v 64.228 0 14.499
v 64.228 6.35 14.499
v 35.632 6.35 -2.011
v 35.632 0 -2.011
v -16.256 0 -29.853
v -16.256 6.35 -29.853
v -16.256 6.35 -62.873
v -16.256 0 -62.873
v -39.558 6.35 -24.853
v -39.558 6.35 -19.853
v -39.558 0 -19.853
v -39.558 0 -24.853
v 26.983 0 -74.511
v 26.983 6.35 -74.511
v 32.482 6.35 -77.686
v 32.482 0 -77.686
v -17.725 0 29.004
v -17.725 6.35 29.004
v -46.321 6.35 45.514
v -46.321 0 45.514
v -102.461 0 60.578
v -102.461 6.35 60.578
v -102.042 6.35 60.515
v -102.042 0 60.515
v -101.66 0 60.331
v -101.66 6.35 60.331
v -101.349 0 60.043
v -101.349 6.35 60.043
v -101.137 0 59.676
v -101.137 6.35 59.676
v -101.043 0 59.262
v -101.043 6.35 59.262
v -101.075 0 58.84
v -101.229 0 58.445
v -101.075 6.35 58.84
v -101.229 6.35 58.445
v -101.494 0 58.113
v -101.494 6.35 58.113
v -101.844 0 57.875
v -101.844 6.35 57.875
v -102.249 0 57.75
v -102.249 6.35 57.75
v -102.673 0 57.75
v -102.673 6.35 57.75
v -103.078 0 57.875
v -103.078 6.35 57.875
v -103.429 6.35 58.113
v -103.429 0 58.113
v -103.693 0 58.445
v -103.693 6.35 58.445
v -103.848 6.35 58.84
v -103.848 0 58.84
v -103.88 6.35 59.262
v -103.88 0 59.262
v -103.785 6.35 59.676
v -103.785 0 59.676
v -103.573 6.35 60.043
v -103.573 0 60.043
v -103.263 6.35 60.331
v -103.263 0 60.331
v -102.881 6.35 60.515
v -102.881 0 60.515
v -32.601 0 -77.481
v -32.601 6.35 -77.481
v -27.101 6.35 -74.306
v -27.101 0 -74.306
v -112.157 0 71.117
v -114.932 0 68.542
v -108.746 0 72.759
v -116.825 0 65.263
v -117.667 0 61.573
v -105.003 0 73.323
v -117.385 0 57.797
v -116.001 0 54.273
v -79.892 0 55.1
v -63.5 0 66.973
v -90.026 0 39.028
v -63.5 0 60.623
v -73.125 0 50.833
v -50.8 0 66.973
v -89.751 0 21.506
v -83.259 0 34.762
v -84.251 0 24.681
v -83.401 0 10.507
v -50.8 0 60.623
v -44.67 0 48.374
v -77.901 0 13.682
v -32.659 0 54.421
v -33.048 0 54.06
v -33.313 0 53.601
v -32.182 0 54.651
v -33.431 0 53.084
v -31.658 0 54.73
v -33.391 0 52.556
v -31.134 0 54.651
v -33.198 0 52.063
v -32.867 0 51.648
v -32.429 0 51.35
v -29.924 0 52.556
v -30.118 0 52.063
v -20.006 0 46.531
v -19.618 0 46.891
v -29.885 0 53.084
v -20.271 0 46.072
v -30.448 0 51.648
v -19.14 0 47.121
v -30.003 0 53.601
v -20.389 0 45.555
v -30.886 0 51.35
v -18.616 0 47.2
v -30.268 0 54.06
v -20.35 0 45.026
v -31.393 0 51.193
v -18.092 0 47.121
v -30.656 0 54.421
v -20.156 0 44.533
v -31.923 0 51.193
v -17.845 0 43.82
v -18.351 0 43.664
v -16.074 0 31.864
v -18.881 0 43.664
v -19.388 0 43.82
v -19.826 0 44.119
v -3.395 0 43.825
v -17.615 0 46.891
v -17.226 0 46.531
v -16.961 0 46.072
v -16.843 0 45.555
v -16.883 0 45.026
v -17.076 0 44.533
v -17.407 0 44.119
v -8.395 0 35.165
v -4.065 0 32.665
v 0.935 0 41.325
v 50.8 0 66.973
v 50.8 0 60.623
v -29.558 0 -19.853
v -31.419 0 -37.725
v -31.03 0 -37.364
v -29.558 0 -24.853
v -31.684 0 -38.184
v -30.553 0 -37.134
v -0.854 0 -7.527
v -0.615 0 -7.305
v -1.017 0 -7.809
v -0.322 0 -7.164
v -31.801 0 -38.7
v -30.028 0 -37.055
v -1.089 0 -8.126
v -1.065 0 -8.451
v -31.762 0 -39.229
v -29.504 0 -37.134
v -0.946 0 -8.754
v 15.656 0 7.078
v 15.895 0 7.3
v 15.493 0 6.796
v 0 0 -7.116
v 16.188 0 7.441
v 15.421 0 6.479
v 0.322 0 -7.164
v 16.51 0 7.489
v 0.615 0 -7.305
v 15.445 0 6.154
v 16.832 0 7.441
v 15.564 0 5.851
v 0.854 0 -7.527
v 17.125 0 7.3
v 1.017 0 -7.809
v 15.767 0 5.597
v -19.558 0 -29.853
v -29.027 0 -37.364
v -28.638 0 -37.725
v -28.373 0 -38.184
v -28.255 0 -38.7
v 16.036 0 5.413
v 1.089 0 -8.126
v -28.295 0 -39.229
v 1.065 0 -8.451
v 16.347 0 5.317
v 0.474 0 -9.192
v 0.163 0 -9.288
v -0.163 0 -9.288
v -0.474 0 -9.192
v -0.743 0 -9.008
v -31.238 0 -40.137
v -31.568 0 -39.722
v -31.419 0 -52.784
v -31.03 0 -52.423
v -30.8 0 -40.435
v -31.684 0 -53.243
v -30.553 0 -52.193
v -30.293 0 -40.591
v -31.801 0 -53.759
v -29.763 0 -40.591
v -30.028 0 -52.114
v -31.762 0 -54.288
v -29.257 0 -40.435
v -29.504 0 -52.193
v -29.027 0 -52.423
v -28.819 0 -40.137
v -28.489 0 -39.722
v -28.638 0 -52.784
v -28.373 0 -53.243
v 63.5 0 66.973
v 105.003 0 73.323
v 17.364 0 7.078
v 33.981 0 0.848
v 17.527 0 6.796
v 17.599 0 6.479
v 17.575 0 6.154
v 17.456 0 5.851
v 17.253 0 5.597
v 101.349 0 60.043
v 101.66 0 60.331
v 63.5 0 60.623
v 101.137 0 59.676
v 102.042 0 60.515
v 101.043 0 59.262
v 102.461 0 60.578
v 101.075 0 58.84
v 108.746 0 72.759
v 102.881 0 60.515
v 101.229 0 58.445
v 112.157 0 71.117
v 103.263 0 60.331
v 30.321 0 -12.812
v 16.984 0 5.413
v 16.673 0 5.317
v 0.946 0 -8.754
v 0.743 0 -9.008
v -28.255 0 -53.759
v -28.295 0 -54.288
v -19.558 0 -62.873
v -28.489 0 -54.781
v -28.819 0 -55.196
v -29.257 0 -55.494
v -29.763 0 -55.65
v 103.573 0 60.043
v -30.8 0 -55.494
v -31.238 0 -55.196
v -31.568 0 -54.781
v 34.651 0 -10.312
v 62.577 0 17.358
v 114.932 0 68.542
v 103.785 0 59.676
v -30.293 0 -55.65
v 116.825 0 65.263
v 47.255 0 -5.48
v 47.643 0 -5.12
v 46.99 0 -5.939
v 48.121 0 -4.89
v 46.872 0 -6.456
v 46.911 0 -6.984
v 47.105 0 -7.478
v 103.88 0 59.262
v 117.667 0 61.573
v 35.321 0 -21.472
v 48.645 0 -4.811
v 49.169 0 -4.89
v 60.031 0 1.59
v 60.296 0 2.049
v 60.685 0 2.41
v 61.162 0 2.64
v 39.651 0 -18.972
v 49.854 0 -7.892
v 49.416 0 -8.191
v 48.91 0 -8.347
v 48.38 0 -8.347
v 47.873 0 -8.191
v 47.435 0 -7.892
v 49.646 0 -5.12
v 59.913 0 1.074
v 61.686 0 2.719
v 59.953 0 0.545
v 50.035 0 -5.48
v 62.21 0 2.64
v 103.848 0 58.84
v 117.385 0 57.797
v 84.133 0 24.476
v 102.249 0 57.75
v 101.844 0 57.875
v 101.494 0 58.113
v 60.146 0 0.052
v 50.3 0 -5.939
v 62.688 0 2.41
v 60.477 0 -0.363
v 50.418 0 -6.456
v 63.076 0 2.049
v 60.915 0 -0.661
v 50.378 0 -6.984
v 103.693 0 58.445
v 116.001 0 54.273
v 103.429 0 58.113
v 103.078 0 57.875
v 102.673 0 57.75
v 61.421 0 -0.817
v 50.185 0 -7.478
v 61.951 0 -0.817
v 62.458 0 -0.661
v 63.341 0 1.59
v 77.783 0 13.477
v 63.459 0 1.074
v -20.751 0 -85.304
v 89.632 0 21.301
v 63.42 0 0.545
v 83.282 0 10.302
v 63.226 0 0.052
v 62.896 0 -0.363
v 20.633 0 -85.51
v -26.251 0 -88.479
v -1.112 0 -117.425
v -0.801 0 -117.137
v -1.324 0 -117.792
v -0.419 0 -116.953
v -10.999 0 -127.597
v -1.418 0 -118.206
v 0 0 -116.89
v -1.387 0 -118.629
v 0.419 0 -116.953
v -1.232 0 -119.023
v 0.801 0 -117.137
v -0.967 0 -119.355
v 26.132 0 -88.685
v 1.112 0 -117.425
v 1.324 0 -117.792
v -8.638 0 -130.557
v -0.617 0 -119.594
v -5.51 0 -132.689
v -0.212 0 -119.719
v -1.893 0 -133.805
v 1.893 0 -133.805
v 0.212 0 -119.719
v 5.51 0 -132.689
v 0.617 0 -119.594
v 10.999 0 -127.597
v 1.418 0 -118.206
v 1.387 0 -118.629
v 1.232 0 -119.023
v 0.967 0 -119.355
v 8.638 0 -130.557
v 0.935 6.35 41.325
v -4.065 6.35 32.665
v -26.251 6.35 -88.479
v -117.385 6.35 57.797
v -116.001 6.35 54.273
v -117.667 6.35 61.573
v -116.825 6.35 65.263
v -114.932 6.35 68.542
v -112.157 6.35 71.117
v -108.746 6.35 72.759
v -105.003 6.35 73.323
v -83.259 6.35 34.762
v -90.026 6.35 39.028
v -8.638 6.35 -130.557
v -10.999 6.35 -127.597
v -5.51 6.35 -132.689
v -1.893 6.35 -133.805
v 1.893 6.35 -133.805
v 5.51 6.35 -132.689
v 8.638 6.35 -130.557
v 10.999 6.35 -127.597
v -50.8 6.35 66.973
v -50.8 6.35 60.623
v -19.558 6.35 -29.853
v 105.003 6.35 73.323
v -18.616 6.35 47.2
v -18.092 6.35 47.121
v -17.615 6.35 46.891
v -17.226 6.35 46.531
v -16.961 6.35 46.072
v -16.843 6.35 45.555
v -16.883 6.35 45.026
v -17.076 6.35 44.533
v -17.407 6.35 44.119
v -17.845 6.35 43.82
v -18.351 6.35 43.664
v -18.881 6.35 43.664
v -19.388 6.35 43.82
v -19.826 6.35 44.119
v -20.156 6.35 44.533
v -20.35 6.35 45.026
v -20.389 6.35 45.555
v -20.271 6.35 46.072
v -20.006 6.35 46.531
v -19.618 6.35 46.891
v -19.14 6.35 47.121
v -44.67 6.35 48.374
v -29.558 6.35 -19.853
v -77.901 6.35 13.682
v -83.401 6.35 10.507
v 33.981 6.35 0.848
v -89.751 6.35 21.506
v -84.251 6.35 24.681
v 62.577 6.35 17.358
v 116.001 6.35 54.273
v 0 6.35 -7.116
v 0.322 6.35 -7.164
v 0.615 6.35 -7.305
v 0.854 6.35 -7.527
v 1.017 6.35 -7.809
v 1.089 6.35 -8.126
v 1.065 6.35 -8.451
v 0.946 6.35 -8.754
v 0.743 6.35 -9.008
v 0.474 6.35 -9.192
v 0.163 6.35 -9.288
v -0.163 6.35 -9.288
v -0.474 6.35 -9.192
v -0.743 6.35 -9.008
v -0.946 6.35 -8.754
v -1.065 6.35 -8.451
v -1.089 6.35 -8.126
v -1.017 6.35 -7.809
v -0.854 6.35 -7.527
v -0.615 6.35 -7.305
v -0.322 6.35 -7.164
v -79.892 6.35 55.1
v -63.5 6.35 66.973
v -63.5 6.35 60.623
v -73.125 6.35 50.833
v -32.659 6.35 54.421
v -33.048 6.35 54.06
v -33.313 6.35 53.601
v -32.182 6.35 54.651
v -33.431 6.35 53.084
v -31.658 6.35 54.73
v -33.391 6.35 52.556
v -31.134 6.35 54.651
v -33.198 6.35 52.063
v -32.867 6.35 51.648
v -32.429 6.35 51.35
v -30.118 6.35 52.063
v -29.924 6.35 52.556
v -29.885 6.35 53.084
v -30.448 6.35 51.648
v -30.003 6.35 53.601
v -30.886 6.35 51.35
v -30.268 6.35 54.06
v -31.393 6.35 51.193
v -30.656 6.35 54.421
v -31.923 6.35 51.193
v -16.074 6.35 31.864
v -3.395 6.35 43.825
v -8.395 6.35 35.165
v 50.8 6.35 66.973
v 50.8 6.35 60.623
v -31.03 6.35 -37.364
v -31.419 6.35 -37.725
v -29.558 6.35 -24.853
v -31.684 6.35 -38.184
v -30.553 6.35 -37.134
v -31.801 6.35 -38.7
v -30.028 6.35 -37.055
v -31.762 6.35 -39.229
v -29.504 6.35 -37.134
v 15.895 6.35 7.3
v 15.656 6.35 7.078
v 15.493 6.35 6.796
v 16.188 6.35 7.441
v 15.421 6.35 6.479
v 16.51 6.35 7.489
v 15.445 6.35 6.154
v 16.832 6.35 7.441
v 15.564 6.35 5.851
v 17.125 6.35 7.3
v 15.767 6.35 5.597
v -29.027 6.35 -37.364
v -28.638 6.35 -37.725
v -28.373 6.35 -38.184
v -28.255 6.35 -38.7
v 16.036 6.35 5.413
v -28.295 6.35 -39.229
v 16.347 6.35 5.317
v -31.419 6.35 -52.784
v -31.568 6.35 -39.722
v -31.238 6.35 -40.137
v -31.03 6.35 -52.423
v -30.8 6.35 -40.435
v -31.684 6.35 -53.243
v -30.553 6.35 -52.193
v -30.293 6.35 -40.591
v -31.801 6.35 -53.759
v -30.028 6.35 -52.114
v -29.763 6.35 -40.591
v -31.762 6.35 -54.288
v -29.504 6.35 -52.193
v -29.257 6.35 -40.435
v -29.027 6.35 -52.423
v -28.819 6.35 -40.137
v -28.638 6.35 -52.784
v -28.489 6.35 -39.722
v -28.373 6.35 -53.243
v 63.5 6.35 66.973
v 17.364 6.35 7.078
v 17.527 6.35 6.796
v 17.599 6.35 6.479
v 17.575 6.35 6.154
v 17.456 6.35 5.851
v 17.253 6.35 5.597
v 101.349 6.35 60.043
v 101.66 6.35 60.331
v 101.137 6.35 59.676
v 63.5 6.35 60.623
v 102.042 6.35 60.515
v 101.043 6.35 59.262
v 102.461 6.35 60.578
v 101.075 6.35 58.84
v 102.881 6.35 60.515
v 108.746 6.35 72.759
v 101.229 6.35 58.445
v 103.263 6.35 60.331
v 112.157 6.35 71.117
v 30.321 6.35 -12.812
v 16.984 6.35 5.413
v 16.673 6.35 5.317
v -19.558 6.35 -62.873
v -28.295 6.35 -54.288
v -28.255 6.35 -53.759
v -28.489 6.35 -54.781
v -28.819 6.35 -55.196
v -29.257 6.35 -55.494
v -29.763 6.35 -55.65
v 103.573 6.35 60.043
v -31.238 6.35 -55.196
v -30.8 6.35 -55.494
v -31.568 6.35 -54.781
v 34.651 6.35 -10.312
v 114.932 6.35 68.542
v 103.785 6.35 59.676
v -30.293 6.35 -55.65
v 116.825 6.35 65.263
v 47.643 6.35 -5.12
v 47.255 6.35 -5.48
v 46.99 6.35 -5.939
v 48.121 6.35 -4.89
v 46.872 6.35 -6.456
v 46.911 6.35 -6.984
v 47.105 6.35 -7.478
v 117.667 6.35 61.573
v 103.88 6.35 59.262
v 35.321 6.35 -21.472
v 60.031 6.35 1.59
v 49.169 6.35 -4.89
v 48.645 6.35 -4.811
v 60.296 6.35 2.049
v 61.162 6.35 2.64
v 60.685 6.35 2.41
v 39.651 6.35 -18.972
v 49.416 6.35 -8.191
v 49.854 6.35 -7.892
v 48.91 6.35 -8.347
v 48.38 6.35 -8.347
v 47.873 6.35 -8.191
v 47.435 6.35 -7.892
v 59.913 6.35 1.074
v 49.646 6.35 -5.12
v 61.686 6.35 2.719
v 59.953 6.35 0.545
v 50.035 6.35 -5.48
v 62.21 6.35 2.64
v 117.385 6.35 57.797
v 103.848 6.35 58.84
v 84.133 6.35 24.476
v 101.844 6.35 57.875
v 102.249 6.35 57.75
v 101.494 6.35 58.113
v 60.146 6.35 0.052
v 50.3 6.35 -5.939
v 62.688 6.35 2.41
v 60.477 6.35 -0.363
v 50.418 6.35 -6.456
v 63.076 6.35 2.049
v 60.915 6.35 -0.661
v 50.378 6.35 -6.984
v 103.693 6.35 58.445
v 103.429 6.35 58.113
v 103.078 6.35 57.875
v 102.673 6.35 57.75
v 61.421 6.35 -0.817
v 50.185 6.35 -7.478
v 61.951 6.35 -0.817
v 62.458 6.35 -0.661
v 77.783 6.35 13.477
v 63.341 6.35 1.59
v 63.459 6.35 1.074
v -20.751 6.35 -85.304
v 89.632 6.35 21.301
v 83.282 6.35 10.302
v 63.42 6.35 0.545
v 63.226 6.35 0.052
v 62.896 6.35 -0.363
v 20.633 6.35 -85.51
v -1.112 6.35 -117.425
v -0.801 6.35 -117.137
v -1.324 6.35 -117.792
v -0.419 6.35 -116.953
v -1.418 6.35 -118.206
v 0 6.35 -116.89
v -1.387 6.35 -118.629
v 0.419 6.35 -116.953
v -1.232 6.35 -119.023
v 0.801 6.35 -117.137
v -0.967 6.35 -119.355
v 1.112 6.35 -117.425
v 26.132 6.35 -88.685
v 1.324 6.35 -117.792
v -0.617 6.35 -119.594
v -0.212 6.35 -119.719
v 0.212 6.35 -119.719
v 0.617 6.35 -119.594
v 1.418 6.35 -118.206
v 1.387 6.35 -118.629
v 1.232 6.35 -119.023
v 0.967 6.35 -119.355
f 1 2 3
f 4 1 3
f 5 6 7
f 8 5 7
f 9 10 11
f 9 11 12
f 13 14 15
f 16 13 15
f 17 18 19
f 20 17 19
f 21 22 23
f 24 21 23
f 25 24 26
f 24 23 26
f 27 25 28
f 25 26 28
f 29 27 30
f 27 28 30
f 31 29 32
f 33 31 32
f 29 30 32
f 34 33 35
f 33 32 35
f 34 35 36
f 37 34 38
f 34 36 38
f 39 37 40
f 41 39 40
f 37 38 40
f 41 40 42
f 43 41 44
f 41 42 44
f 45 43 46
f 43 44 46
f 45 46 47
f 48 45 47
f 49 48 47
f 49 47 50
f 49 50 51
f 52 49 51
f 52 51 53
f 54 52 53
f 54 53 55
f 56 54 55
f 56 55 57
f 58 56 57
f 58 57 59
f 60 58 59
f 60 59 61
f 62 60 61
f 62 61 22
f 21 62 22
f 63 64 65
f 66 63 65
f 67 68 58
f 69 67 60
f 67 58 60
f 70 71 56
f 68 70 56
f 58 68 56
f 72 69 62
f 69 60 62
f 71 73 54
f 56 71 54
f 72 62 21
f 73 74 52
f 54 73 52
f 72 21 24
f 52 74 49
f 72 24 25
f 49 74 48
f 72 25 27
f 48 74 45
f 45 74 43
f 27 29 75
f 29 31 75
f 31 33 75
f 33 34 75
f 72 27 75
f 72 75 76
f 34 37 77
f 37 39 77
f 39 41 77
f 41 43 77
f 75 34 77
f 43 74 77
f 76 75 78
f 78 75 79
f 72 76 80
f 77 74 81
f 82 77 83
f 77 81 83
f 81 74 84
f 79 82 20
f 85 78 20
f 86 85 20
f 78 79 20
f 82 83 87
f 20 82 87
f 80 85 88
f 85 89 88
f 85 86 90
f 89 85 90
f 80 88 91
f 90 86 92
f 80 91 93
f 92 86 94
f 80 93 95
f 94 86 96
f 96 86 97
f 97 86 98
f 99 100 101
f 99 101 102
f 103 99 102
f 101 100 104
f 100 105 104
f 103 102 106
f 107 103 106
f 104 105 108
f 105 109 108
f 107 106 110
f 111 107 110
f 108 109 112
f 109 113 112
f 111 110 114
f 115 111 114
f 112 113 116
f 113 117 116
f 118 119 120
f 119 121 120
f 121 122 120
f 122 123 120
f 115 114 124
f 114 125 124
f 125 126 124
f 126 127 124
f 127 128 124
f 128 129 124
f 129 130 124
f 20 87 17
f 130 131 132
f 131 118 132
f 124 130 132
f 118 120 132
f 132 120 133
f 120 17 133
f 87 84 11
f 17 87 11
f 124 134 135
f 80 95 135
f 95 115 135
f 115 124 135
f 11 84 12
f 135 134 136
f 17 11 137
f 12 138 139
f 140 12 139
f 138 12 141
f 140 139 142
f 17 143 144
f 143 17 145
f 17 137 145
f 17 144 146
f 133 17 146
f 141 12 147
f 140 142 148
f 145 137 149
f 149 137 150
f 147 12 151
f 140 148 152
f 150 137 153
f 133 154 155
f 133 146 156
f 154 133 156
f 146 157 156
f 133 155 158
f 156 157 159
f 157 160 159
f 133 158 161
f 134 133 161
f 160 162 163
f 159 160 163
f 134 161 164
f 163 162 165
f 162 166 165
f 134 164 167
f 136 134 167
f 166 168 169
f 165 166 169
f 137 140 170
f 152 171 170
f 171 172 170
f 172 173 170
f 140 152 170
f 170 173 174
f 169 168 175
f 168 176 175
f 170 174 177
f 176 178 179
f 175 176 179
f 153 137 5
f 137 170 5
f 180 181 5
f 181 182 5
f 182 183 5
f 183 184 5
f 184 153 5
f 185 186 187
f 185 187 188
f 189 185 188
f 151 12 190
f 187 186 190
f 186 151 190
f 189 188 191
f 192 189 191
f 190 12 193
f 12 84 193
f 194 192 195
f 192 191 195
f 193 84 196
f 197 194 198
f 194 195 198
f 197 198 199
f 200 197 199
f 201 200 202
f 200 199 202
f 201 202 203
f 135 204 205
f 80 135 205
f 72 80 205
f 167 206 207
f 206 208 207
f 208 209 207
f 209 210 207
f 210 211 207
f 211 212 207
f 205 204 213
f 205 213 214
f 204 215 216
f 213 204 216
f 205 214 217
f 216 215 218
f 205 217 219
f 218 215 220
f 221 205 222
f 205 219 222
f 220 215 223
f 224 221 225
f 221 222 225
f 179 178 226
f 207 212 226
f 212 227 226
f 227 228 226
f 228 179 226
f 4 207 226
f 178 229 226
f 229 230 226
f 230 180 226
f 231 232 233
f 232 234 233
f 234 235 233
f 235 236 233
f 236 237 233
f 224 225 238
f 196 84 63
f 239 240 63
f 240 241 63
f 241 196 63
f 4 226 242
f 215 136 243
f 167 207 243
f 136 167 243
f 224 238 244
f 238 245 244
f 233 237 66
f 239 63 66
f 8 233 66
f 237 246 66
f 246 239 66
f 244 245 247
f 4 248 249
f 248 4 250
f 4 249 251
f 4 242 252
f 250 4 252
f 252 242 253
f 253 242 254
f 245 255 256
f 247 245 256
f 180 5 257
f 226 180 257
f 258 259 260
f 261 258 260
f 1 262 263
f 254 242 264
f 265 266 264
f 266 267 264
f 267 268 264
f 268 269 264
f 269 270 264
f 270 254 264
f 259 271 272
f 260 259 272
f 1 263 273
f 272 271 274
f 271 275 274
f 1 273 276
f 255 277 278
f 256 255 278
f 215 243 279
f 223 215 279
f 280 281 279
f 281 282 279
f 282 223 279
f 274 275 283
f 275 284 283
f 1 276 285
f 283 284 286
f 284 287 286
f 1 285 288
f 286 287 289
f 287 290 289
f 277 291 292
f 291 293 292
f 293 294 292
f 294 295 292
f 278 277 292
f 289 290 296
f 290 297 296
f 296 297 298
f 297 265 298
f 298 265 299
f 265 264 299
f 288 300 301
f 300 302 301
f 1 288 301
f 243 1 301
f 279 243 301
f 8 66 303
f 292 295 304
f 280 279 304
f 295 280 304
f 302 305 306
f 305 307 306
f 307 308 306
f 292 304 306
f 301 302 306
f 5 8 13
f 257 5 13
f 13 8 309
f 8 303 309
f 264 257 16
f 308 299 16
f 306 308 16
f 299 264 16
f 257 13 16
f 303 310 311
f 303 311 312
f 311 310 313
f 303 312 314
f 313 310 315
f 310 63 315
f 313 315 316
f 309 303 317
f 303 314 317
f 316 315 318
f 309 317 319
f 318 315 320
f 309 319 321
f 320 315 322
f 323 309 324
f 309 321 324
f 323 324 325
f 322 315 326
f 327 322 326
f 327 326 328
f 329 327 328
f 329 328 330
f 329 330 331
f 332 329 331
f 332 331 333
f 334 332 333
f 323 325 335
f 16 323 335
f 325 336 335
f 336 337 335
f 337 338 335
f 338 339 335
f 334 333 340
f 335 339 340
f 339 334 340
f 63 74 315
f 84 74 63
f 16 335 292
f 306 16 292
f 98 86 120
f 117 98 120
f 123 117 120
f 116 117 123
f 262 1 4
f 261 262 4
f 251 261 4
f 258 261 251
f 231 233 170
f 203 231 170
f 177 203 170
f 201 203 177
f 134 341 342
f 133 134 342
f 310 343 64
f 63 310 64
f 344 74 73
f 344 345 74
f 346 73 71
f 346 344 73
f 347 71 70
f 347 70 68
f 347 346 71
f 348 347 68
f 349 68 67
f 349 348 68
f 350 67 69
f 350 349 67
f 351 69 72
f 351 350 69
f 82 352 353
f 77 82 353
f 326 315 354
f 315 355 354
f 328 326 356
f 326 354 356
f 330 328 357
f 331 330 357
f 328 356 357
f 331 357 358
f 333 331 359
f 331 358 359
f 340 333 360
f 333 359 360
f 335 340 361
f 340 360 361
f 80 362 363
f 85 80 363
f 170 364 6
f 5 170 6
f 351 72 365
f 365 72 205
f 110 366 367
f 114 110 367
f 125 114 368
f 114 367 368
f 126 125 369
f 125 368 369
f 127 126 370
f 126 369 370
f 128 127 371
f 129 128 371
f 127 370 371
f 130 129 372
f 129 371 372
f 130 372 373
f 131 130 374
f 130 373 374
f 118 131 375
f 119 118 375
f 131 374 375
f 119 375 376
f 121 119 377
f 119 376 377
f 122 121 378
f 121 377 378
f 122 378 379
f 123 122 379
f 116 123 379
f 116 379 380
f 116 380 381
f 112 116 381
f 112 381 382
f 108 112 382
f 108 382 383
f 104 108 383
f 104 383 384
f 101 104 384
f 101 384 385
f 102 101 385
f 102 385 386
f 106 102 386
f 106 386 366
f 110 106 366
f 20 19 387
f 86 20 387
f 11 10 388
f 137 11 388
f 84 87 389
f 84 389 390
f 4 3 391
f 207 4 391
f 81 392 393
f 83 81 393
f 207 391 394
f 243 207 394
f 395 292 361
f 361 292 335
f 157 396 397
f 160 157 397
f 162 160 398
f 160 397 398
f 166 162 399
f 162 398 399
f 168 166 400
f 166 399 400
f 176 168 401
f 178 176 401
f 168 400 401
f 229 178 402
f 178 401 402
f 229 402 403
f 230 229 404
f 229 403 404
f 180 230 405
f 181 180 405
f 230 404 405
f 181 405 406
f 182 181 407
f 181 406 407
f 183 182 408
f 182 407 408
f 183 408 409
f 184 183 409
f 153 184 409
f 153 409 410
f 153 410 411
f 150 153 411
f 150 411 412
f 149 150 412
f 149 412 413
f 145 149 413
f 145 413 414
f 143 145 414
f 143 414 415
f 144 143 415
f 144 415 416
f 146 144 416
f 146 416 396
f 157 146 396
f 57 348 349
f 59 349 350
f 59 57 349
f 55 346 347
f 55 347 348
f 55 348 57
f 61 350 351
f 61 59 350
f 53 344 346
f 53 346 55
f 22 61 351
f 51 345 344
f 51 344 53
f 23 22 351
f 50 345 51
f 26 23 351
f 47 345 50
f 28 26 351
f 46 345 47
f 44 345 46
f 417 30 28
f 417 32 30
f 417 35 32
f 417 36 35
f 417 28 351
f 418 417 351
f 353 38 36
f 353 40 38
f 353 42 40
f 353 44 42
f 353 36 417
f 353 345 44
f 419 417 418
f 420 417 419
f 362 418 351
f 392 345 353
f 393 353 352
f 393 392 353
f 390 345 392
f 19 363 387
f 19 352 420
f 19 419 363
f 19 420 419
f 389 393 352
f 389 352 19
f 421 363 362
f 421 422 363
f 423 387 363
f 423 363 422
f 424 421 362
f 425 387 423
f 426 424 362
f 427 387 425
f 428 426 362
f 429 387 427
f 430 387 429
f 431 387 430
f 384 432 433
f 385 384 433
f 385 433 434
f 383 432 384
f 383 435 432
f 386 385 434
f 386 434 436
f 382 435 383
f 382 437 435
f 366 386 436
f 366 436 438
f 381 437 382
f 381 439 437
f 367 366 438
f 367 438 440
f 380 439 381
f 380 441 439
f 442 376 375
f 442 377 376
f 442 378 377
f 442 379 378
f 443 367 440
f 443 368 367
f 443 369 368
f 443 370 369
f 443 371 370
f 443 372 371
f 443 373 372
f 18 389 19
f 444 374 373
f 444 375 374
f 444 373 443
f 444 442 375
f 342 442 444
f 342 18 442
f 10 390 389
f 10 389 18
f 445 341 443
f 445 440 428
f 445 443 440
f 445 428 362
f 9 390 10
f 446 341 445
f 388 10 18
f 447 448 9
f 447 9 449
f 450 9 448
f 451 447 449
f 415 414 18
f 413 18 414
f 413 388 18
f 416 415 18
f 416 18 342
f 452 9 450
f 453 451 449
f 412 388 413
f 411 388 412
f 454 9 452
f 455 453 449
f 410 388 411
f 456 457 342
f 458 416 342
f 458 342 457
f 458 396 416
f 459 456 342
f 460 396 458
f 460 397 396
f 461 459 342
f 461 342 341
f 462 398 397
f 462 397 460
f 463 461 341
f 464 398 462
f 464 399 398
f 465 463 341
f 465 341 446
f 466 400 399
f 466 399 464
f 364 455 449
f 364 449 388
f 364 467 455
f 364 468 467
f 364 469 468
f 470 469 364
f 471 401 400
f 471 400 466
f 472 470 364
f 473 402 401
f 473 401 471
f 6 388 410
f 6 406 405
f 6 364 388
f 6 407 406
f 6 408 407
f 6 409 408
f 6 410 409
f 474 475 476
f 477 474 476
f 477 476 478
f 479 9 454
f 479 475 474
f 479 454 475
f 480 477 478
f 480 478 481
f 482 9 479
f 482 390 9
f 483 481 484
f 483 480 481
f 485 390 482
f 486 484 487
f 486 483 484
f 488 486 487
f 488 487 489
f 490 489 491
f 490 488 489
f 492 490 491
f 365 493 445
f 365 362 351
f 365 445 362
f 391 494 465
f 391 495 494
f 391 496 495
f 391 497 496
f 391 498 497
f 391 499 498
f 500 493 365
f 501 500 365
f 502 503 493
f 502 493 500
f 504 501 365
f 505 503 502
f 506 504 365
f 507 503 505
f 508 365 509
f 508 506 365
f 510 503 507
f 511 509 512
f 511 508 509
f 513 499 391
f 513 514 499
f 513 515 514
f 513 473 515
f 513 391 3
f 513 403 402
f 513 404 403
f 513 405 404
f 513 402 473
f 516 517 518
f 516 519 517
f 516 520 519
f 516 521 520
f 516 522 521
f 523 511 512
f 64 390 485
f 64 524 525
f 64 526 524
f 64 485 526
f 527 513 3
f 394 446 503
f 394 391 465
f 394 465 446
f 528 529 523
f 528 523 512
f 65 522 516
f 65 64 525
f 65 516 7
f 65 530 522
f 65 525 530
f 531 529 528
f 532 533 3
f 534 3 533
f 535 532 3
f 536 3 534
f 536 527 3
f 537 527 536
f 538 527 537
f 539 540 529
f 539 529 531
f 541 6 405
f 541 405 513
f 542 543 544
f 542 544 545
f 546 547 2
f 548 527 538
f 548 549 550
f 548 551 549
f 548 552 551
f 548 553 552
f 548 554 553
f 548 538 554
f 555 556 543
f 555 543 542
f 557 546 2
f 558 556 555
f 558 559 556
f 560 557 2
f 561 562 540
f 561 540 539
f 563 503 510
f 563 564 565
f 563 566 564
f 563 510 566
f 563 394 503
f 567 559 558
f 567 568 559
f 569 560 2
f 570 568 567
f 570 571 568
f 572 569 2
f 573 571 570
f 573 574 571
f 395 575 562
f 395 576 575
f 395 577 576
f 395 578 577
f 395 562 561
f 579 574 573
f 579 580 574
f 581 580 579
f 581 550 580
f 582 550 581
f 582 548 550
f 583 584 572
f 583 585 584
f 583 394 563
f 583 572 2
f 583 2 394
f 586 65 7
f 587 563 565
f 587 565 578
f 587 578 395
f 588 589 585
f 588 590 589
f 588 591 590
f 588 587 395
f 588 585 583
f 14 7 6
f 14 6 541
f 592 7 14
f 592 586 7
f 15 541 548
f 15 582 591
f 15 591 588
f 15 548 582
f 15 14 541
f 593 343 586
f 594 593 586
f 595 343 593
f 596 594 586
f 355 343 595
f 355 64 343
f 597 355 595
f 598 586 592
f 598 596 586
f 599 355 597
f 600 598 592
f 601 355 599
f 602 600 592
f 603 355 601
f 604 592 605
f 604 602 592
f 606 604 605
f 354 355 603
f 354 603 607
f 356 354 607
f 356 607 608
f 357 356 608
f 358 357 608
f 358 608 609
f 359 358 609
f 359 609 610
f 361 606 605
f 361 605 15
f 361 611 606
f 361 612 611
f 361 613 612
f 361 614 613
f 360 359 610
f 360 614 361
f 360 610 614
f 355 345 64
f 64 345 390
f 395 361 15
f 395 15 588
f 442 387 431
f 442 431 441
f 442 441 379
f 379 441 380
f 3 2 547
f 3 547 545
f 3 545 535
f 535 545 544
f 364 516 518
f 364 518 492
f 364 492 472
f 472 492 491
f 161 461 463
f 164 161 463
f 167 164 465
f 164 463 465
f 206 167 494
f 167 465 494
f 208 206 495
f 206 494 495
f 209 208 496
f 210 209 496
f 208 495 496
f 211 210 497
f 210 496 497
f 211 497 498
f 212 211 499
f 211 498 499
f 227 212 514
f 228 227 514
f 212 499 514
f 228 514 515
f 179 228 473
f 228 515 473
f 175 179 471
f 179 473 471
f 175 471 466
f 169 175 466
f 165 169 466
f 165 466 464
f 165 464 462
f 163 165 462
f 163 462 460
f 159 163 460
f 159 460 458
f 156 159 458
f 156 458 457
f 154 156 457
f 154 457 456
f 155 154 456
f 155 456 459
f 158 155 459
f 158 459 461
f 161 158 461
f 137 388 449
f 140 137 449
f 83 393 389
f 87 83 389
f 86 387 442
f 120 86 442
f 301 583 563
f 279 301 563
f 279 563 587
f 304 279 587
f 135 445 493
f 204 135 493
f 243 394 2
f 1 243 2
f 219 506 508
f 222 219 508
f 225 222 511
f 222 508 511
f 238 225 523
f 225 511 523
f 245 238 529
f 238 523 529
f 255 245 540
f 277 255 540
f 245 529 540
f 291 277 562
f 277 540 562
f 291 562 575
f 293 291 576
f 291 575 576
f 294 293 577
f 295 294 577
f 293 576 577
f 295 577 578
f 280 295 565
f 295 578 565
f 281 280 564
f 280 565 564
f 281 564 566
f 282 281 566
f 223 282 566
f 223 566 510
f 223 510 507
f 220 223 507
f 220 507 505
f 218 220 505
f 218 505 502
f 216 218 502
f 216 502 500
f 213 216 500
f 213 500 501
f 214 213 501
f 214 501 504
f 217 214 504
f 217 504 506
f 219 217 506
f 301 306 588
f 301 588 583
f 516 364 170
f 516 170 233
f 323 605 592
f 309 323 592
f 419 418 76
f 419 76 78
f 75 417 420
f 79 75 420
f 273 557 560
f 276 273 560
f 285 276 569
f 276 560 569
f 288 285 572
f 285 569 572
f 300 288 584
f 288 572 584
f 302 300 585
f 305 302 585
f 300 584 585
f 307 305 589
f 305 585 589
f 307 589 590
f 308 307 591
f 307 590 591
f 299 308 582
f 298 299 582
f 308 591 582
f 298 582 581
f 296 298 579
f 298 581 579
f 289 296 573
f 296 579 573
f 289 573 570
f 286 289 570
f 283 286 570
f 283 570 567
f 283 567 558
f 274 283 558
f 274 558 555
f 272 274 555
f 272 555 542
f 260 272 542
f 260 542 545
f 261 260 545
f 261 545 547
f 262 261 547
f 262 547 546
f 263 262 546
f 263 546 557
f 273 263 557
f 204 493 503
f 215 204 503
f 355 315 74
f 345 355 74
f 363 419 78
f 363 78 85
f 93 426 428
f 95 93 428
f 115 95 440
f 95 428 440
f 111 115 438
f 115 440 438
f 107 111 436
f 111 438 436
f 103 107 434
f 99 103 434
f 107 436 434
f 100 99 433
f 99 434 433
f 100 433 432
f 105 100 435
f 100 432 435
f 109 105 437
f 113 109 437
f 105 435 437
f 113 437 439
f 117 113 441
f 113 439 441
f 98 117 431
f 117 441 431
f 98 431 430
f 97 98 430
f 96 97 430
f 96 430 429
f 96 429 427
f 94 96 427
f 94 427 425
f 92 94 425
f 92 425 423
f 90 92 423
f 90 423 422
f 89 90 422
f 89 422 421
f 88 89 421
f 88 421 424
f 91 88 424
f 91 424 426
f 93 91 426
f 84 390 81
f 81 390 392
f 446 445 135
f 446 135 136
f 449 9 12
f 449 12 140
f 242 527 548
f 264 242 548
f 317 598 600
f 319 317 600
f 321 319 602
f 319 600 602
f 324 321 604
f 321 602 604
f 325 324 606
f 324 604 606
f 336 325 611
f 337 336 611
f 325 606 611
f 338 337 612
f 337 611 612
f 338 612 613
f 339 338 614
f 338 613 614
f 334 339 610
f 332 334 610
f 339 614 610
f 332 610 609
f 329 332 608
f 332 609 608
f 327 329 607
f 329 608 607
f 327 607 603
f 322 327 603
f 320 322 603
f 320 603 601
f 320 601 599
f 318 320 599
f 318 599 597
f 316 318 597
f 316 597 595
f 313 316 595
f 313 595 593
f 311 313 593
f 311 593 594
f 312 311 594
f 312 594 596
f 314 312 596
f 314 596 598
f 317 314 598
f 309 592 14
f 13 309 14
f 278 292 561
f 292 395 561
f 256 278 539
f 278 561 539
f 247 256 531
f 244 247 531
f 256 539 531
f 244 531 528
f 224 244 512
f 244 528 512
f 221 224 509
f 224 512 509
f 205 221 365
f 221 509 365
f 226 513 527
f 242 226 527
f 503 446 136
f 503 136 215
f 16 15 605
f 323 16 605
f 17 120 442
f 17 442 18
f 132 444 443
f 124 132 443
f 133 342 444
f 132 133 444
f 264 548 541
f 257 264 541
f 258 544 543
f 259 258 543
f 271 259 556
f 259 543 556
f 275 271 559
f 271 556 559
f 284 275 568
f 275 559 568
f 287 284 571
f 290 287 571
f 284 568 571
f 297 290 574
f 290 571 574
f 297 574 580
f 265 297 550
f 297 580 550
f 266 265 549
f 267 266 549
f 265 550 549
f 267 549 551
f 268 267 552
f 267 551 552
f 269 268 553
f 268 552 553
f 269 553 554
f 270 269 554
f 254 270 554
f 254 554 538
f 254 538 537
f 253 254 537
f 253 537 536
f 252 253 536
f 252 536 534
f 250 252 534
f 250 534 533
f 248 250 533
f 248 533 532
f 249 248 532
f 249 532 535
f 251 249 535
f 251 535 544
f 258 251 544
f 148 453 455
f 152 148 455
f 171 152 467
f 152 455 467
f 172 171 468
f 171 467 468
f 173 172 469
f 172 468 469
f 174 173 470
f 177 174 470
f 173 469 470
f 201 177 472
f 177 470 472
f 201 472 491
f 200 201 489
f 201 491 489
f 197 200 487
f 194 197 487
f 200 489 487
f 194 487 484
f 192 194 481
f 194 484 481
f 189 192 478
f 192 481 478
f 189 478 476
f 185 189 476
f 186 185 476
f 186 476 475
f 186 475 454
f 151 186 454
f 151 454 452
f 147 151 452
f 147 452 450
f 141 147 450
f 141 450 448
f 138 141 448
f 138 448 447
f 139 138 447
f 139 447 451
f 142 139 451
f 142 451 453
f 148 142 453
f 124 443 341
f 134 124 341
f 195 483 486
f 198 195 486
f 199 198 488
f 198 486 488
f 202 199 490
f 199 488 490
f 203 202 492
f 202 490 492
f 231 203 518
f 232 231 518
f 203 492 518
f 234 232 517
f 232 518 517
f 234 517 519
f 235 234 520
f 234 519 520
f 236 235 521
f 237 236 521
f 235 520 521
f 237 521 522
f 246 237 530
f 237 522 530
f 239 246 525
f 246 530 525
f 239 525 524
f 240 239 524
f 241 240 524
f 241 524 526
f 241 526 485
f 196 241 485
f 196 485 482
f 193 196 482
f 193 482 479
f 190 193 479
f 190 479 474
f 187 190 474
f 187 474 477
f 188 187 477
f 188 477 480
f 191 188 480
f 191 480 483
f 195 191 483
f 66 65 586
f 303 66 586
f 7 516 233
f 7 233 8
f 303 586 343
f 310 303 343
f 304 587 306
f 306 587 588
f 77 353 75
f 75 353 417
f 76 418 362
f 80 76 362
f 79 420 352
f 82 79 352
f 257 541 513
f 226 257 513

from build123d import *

# Parameters (mm, degrees)
BOSS_EXTRUDE1_DEPTH = 6.35
SKETCH2_W           = 3.302
SKETCH2_H           = 33.02
SKETCH2_R           = 1.778
CUT_EXTRUDE1_DEPTH  = 195.099602868
SKETCH3_R           = 1.4224
SKETCH3_W           = 10
SKETCH3_H           = 5
CUT_EXTRUDE2_DEPTH  = 195.099602868
SKETCH4_R           = 1.0922
CUT_EXTRUDE3_DEPTH  = 195.099602868
FILLET1_R           = 12.7
SKETCH5_W           = 12.7
SKETCH5_H           = 6.35
CUT_EXTRUDE4_DEPTH  = 179.426731159
CUT_EXTRUDE5_DEPTH  = 179.426731159


with BuildPart() as part:
    # Sketch1 → Boss-Extrude1 (new body)
    with BuildSketch(Plane(origin=(0, 0, 0), x_dir=(1, 0, 0), z_dir=(0, 1, 0))):
        Polygon((0, 146.646968374), (-127, -73.323484187), (127, -73.323484187), align=None)
    extrude(amount=BOSS_EXTRUDE1_DEPTH)

    # Sketch2 → Cut-Extrude1 (cut, through all)
    with BuildSketch(Plane(origin=(0, 6.35, 0), x_dir=(1, 0, 0), z_dir=(0, 1, 0))):
        with Locations((-17.907, 46.362701567)):
            Rectangle(SKETCH2_W, SKETCH2_H)
        Polygon((64.228356761, -14.498625936), (35.632197928, 2.011374064), (33.981197928, -0.848241819), (62.577356761, -17.358241819), align=None)
        with Locations(Location((48.644716778, 6.588823684, 0), (0, 0, 270))):
            Circle(SKETCH2_R)
        with Locations(Location((61.686284992, -0.940729235, 0), (0, 0, 270))):
            Circle(SKETCH2_R)
        with Locations(Location((-30.028447081, 38.833148648, 0), (0, 0, 270))):
            Circle(SKETCH2_R)
        with Locations(Location((-30.028447081, 53.892254486, 0), (0, 0, 270))):
            Circle(SKETCH2_R)
        Polygon((-16.074197928, -31.864075631), (-17.725197928, -29.004459747), (-46.321356761, -45.514459747), (-44.670356761, -48.374075631), align=None)
        with Locations(Location((-18.616269697, -45.421972332, 0), (0, 0, 270))):
            Circle(SKETCH2_R)
        with Locations(Location((-31.657837912, -52.951525251, 0), (0, 0, 270))):
            Circle(SKETCH2_R)
    extrude(amount=-CUT_EXTRUDE1_DEPTH, mode=Mode.SUBTRACT)

    # Sketch3 → Cut-Extrude2 (cut, through all)
    with BuildSketch(Plane(origin=(0, 6.35, 0), x_dir=(1, 0, 0), z_dir=(0, 1, 0))):
        with Locations(Location((0, 118.312139176, 0), (0, 0, 270))):
            Circle(SKETCH3_R)
        with Locations(Location((-102.461318102, -59.156069588, 0), (0, 0, 270))):
            Circle(SKETCH3_R)
        with Locations(Location((102.461318102, -59.156069588, 0), (0, 0, 270))):
            Circle(SKETCH3_R)
        with Locations((-34.558, 22.352701567)):
            Rectangle(SKETCH3_W, SKETCH3_H)
        Polygon((0.935056109, -41.324967823), (-4.064943891, -32.664713785), (-8.395070909, -35.164713785), (-3.395070909, -43.824967823), align=None)
        Polygon((35.320943891, 21.472266256), (30.320943891, 12.812012218), (34.651070909, 10.312012218), (39.651070909, 18.972266256), align=None)
    extrude(amount=-CUT_EXTRUDE2_DEPTH, mode=Mode.SUBTRACT)

    # Sketch4 → Cut-Extrude3 (cut, through all)
    with BuildSketch(Plane(origin=(0, 6.35, 0), x_dir=(1, 0, 0), z_dir=(0, 1, 0))):
        with Locations(Location((0, 8.207705491, 0), (0, 0, 270))):
            Circle(SKETCH4_R)
        with Locations(Location((16.51, -6.397294509, 0), (0, 0, 270))):
            Circle(SKETCH4_R)
    extrude(amount=-CUT_EXTRUDE3_DEPTH, mode=Mode.SUBTRACT)

    # Fillet1
    fillet1_edges = [part.edges().sort_by_distance(p)[0] for p in [
        (127, 3.175, 73.323484187),
        (-127, 3.175, 73.323484187),
        (0, 3.175, -146.646968374),
    ]]
    fillet(fillet1_edges, radius=FILLET1_R)

    # Sketch5 → Cut-Extrude4 (cut, through all)
    with BuildSketch(Plane(origin=(0, 6.35, 0), x_dir=(1, 0, 0), z_dir=(0, 1, 0))):
        with Locations((-57.15, -63.798484187)):
            Rectangle(SKETCH5_W, SKETCH5_H)
        with Locations((57.15, -63.798484187)):
            Rectangle(SKETCH5_W, SKETCH5_H)
        Polygon((89.632293954, -21.300718754), (83.282293954, -10.302196126), (77.78303264, -13.477196126), (84.13303264, -24.475718754), align=None)
        Polygon((26.98303264, 74.510984899), (32.482293954, 77.685984899), (26.132293954, 88.684507527), (20.63303264, 85.509507527), align=None)
        Polygon((-26.250738686, 88.479355234), (-32.600738686, 77.480832606), (-27.101477372, 74.305832606), (-20.751477372, 85.304355234), align=None)
        Polygon((-77.901477372, -13.682348419), (-83.400738686, -10.507348419), (-89.750738686, -21.505871047), (-84.251477372, -24.680871047), align=None)
    extrude(amount=-CUT_EXTRUDE4_DEPTH, mode=Mode.SUBTRACT)

    # Sketch6 → Cut-Extrude5 (cut, through all)
    with BuildSketch(Plane(origin=(0, 6.35, 0), x_dir=(1, 0, 0), z_dir=(0, 1, 0))):
        Polygon((-73.125150775, -50.833442097), (-83.259043602, -34.761596647), (-90.026136423, -39.02849889), (-79.892243597, -55.10034434), align=None)
    extrude(amount=-CUT_EXTRUDE5_DEPTH, mode=Mode.SUBTRACT)


solid = part.part
